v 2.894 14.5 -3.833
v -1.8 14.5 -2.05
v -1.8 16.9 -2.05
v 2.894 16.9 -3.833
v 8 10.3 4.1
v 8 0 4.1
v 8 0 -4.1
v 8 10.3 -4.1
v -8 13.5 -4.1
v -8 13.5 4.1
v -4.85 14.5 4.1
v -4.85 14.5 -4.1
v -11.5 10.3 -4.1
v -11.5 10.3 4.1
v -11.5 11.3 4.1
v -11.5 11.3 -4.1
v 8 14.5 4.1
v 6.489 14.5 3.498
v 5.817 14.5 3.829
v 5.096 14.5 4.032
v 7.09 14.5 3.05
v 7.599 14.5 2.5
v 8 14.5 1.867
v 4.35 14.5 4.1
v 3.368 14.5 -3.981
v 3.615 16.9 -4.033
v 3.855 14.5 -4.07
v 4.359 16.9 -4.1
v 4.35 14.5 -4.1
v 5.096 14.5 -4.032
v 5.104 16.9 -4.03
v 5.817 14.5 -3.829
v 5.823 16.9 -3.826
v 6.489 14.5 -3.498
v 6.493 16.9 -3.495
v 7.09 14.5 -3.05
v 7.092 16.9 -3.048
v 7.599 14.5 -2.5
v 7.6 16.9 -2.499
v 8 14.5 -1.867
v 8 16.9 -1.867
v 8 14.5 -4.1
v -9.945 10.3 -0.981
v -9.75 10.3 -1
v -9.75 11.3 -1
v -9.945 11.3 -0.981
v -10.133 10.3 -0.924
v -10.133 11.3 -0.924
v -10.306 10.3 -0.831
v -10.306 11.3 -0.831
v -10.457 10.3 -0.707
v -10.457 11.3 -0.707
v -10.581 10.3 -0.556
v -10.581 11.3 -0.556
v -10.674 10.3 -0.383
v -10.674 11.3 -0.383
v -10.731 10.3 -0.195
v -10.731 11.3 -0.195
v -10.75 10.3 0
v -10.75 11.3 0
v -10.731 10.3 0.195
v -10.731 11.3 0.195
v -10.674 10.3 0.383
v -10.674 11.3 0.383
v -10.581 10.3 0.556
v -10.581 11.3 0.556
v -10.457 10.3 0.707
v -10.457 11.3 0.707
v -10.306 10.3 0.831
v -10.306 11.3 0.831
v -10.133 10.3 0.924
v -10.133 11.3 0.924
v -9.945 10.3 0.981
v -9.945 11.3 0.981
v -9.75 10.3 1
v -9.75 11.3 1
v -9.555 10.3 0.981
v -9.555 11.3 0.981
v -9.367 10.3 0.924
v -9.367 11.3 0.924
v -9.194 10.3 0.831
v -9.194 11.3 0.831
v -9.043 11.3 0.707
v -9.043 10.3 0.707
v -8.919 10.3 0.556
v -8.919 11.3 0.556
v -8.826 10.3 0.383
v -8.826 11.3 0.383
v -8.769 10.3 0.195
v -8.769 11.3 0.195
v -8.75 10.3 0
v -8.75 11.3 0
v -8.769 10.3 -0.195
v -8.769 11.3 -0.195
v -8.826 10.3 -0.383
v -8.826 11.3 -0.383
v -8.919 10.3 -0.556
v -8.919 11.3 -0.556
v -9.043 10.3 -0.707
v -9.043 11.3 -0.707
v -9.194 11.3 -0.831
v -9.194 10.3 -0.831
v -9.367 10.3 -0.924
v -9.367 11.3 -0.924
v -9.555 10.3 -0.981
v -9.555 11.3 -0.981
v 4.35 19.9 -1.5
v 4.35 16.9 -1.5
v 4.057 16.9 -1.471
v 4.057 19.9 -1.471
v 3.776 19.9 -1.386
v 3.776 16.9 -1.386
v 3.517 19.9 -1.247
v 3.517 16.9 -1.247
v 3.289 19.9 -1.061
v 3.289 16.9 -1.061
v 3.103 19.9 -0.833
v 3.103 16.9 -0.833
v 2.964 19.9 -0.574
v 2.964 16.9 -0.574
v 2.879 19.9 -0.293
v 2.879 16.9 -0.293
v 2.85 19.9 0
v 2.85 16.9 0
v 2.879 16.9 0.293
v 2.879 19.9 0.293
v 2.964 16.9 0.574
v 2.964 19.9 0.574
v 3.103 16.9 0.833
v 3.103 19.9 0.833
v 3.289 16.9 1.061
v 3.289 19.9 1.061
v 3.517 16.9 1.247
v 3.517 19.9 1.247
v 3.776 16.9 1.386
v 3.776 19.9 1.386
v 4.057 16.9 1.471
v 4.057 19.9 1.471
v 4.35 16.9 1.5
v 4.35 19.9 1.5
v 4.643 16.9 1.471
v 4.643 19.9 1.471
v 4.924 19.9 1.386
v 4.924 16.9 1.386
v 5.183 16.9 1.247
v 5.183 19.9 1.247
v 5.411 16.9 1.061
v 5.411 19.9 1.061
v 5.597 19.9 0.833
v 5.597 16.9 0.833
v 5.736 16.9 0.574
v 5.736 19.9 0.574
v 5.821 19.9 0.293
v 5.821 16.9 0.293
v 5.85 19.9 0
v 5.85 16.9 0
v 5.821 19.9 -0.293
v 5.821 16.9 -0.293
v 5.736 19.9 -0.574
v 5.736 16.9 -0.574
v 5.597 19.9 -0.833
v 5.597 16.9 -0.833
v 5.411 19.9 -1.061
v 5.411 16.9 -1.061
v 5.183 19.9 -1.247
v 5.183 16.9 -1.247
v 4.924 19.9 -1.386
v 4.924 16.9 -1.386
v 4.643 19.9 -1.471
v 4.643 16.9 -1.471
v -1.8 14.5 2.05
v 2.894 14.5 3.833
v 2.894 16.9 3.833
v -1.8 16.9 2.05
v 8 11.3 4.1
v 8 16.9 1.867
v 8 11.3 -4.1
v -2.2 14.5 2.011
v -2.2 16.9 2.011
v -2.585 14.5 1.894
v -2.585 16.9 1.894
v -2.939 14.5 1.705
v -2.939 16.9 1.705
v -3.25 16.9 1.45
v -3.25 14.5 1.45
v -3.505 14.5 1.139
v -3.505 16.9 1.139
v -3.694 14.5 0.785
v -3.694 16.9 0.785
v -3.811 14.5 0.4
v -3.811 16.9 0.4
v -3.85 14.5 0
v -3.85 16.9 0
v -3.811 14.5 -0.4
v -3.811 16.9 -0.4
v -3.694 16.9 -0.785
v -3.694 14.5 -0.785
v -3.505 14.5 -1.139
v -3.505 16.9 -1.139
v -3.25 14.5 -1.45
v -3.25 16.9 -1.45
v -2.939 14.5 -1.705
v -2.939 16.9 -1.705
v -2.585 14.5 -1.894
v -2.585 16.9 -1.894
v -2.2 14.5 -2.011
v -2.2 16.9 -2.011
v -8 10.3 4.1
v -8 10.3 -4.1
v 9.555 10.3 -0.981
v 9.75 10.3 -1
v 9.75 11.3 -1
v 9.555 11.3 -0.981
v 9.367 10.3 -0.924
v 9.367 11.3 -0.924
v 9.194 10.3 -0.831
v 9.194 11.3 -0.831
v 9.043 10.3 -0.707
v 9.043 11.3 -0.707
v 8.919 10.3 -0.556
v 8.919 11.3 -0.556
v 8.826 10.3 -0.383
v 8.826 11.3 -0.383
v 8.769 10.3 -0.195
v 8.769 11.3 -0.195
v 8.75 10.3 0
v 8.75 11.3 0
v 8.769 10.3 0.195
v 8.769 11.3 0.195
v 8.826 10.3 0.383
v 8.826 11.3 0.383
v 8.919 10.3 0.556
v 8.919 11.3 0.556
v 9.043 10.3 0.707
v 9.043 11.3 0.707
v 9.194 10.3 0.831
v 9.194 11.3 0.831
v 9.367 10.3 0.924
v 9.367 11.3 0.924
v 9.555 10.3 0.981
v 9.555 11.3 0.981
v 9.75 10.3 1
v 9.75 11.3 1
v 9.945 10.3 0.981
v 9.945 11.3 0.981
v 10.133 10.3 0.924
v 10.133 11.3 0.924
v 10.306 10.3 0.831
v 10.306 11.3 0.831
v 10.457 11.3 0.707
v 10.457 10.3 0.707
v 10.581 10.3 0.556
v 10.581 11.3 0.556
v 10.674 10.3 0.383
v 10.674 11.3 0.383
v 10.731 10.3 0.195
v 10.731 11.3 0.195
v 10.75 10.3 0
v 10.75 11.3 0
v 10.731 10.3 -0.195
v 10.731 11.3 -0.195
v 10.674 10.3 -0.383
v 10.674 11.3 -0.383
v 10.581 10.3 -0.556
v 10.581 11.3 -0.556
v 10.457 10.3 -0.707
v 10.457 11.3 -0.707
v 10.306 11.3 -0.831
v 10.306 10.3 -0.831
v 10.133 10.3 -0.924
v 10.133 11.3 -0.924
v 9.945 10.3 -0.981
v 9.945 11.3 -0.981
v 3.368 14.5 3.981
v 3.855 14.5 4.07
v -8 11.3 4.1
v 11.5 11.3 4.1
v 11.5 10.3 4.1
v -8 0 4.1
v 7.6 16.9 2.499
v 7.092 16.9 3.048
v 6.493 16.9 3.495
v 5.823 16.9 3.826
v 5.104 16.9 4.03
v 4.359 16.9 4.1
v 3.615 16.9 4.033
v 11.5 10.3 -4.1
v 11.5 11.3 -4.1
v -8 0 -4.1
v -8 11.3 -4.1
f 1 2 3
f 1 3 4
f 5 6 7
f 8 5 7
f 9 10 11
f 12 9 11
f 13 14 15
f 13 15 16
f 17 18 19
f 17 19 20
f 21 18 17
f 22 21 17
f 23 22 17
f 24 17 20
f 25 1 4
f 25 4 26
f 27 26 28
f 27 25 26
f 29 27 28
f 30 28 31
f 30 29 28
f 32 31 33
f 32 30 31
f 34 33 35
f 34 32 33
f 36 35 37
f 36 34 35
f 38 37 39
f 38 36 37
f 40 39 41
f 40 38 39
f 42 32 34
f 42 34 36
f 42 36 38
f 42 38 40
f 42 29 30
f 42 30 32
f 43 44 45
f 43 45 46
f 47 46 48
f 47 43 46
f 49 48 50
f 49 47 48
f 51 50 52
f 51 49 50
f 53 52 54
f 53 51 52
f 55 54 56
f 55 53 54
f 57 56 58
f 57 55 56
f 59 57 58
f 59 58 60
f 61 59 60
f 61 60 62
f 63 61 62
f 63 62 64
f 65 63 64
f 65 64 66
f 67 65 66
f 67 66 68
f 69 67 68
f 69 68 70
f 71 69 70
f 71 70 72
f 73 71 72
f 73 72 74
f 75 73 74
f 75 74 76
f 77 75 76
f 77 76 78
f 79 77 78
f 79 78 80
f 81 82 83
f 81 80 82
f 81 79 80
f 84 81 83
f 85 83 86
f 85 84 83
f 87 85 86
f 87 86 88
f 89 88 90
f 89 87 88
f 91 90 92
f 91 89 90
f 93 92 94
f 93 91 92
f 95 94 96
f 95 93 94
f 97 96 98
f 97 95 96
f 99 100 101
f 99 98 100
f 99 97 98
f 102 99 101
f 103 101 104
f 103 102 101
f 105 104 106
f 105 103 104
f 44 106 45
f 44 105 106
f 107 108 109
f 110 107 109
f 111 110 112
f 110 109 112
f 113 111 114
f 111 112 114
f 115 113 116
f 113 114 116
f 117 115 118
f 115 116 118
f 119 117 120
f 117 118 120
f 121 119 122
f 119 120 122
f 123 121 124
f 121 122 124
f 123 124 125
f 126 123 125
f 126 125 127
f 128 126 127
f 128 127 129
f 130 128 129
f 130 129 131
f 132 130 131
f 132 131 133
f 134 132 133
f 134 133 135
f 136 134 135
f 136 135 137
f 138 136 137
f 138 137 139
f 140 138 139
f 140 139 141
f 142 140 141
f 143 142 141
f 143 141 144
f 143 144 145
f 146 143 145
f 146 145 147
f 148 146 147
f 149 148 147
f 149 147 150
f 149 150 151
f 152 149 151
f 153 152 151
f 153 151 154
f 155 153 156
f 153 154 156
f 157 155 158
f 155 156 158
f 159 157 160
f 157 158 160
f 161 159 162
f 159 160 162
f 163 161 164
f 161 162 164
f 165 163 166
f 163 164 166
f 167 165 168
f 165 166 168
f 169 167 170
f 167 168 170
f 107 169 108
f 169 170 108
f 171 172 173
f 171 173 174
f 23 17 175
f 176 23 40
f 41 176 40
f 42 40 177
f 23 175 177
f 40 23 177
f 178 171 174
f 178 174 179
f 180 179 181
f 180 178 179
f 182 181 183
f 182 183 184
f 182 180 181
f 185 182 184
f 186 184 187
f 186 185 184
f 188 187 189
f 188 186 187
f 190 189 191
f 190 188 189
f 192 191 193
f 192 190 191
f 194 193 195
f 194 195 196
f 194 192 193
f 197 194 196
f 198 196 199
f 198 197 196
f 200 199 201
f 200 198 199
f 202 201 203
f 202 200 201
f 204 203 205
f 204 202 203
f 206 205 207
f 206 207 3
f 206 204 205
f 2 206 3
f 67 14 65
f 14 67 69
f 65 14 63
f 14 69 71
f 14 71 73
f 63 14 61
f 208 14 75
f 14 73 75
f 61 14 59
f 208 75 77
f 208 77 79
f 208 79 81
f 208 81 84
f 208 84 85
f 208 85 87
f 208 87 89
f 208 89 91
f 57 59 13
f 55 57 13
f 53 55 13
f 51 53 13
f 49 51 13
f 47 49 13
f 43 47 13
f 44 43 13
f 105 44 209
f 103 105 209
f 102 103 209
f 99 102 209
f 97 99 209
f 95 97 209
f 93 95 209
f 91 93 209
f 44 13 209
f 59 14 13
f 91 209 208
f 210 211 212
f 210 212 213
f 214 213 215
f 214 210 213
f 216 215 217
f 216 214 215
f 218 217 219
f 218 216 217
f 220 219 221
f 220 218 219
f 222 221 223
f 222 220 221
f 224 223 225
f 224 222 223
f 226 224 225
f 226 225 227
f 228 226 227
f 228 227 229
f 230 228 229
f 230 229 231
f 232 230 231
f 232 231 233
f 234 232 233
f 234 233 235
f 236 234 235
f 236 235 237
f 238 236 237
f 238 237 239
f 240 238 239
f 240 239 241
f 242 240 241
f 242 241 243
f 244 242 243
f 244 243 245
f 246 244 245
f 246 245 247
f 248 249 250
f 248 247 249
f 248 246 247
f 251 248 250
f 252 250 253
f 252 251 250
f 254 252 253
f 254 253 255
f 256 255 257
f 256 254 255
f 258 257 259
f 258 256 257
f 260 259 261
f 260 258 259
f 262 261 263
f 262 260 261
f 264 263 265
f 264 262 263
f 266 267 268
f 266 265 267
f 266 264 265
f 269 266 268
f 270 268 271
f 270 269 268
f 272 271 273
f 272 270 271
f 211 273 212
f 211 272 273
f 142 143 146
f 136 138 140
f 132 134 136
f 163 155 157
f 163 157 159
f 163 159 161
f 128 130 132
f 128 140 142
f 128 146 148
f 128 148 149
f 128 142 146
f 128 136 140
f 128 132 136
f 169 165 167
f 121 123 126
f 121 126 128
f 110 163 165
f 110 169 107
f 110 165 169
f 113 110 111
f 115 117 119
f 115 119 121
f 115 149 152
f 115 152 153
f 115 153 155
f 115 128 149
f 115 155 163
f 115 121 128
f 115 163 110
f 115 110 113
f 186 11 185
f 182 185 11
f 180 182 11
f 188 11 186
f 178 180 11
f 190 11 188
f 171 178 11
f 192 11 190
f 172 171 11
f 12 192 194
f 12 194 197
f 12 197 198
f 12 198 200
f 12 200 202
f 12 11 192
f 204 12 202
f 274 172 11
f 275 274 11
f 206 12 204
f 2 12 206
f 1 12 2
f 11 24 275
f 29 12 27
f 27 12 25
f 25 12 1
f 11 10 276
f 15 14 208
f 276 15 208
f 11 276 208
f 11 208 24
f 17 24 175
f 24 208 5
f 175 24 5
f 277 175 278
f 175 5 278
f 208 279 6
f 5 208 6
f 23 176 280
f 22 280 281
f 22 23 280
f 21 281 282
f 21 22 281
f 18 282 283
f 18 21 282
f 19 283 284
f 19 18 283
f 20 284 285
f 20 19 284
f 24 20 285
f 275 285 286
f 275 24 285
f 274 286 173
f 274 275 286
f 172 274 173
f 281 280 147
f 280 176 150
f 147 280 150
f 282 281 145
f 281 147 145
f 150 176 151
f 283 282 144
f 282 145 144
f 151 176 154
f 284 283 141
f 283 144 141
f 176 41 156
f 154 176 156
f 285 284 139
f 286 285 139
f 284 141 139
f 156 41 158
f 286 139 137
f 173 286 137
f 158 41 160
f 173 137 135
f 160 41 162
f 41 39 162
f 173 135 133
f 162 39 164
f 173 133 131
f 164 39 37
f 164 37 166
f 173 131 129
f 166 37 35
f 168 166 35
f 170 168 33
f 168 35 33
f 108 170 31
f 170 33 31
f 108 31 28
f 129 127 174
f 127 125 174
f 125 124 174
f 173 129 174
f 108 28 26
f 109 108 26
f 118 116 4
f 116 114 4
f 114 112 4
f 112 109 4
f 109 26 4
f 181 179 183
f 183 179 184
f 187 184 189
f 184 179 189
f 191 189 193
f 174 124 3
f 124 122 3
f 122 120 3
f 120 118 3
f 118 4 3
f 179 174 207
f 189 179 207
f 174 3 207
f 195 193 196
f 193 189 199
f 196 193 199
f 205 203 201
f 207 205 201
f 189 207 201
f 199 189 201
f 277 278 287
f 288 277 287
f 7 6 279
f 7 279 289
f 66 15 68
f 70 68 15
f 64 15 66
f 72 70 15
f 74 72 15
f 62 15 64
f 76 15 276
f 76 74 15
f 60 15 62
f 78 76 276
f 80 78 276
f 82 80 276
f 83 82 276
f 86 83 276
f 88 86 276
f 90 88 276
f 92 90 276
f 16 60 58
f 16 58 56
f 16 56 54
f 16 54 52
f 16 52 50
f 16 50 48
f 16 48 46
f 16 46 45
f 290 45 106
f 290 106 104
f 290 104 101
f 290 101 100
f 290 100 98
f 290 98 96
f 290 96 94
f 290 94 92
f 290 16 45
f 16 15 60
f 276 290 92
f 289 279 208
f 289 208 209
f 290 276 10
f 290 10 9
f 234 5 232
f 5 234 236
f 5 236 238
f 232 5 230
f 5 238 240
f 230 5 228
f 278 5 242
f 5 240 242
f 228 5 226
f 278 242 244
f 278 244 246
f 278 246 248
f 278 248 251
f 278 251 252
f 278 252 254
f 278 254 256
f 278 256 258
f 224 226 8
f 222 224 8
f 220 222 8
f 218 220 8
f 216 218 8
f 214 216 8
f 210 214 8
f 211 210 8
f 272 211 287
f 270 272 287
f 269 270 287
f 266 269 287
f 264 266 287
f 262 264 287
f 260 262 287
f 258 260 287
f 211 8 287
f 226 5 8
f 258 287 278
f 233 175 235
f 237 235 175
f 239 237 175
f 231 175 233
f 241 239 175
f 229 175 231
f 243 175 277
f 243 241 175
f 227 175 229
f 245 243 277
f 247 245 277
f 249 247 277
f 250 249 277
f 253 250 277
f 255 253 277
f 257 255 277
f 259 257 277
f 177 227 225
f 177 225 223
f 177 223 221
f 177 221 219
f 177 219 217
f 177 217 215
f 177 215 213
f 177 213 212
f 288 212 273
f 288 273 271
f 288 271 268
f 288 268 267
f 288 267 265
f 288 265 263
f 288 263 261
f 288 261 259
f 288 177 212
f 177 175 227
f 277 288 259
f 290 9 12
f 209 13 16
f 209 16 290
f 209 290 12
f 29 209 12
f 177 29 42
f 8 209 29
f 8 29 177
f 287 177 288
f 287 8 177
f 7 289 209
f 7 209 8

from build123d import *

# Parameters (mm, degrees)
SKETCH_1_W               = 16
SKETCH_1_H               = 8.2
EXTRUDE_1_DEPTH          = 10.3
EXTRUDE_START            = 10.3
SKETCH_2_W               = 23
SKETCH_2_H               = 8.2
EXTRUDE_2_DEPTH          = 1
SKETCH_3_W               = 16
SKETCH_3_H               = 8.2
EXTRUDE_3_DEPTH          = 14.5
SKETCH_4_R               = 1
CUT_EXTRUDE_1_DEPTH      = 14.5
EXTRUDE_4_DEPTH          = 16.9
SKETCH_7_R               = 1.5
EXTRUDE_5_DEPTH          = 19.9
CUT_EXTRUDE_2_DEPTH      = 10
CUT_EXTRUDE_2_DEPTH_BACK = 10


with BuildPart() as part:
    # 草图1 → 凸台-拉伸1 (new body)
    with BuildSketch(Plane(origin=(0, 0, 0), x_dir=(1, 0, 0), z_dir=(0, 1, 0))):
        Rectangle(SKETCH_1_W, SKETCH_1_H)
    extrude(amount=EXTRUDE_1_DEPTH)

    # 草图2 → 凸台-拉伸2 (add)
    with BuildSketch(Plane(origin=(0, 0, 0), x_dir=(1, 0, 0), z_dir=(0, 1, 0)).offset(EXTRUDE_START)):
        Rectangle(SKETCH_2_W, SKETCH_2_H)
    extrude(amount=EXTRUDE_2_DEPTH)

    # 草图3 → 凸台-拉伸3 (add)
    with BuildSketch(Plane(origin=(0, 0, 0), x_dir=(1, 0, 0), z_dir=(0, 1, 0))):
        Rectangle(SKETCH_3_W, SKETCH_3_H)
    extrude(amount=EXTRUDE_3_DEPTH)

    # 草图4 → 切除-拉伸1 (cut)
    with BuildSketch(Plane(origin=(0, 0, 0), x_dir=(1, 0, 0), z_dir=(0, 1, 0))):
        with Locations(Location((-9.75, 0, 0), (0, 0, 90))):
            Circle(SKETCH_4_R)
        with Locations(Location((9.75, 0, 0), (0, 0, 90))):
            Circle(SKETCH_4_R)
    extrude(amount=CUT_EXTRUDE_1_DEPTH, mode=Mode.SUBTRACT)

    # 草图6 → 凸台-拉伸4 (add)
    with BuildSketch(Plane(origin=(0, 0, 0), x_dir=(1, 0, 0), z_dir=(0, 1, 0))):
        with BuildLine():
            Line((8, 1.86748494), (8, -1.86748494))
            ThreePointArc((8, -1.86748494), (5.822893402, -3.826301743), (2.894290795, -3.832872384))
            Line((2.894290795, -3.832872384), (-1.8, -2.05))
            ThreePointArc((-1.8, -2.05), (-3.85, 0), (-1.8, 2.05))
            Line((-1.8, 2.05), (2.894290795, 3.832872384))
            ThreePointArc((2.894290795, 3.832872384), (5.822893402, 3.826301743), (8, 1.86748494))
        make_face()
    extrude(amount=EXTRUDE_4_DEPTH)

    # 草图7 → 凸台-拉伸5 (add)
    with BuildSketch(Plane(origin=(0, 0, 0), x_dir=(1, 0, 0), z_dir=(0, 1, 0))):
        with Locations(Location((4.35, 0, 0), (0, 0, 90))):
            Circle(SKETCH_7_R)
    extrude(amount=EXTRUDE_5_DEPTH)

    # 草图8 → 切除-拉伸2 (cut, two sides: drawn at the far end of the back side and taken through both)
    with BuildSketch(Plane.XY.offset(-CUT_EXTRUDE_2_DEPTH_BACK)):
        Polygon((-8, 14.5), (-8, 13.5), (-4.85, 14.5), align=None)
    extrude(amount=CUT_EXTRUDE_2_DEPTH + CUT_EXTRUDE_2_DEPTH_BACK, mode=Mode.SUBTRACT)


solid = part.part
